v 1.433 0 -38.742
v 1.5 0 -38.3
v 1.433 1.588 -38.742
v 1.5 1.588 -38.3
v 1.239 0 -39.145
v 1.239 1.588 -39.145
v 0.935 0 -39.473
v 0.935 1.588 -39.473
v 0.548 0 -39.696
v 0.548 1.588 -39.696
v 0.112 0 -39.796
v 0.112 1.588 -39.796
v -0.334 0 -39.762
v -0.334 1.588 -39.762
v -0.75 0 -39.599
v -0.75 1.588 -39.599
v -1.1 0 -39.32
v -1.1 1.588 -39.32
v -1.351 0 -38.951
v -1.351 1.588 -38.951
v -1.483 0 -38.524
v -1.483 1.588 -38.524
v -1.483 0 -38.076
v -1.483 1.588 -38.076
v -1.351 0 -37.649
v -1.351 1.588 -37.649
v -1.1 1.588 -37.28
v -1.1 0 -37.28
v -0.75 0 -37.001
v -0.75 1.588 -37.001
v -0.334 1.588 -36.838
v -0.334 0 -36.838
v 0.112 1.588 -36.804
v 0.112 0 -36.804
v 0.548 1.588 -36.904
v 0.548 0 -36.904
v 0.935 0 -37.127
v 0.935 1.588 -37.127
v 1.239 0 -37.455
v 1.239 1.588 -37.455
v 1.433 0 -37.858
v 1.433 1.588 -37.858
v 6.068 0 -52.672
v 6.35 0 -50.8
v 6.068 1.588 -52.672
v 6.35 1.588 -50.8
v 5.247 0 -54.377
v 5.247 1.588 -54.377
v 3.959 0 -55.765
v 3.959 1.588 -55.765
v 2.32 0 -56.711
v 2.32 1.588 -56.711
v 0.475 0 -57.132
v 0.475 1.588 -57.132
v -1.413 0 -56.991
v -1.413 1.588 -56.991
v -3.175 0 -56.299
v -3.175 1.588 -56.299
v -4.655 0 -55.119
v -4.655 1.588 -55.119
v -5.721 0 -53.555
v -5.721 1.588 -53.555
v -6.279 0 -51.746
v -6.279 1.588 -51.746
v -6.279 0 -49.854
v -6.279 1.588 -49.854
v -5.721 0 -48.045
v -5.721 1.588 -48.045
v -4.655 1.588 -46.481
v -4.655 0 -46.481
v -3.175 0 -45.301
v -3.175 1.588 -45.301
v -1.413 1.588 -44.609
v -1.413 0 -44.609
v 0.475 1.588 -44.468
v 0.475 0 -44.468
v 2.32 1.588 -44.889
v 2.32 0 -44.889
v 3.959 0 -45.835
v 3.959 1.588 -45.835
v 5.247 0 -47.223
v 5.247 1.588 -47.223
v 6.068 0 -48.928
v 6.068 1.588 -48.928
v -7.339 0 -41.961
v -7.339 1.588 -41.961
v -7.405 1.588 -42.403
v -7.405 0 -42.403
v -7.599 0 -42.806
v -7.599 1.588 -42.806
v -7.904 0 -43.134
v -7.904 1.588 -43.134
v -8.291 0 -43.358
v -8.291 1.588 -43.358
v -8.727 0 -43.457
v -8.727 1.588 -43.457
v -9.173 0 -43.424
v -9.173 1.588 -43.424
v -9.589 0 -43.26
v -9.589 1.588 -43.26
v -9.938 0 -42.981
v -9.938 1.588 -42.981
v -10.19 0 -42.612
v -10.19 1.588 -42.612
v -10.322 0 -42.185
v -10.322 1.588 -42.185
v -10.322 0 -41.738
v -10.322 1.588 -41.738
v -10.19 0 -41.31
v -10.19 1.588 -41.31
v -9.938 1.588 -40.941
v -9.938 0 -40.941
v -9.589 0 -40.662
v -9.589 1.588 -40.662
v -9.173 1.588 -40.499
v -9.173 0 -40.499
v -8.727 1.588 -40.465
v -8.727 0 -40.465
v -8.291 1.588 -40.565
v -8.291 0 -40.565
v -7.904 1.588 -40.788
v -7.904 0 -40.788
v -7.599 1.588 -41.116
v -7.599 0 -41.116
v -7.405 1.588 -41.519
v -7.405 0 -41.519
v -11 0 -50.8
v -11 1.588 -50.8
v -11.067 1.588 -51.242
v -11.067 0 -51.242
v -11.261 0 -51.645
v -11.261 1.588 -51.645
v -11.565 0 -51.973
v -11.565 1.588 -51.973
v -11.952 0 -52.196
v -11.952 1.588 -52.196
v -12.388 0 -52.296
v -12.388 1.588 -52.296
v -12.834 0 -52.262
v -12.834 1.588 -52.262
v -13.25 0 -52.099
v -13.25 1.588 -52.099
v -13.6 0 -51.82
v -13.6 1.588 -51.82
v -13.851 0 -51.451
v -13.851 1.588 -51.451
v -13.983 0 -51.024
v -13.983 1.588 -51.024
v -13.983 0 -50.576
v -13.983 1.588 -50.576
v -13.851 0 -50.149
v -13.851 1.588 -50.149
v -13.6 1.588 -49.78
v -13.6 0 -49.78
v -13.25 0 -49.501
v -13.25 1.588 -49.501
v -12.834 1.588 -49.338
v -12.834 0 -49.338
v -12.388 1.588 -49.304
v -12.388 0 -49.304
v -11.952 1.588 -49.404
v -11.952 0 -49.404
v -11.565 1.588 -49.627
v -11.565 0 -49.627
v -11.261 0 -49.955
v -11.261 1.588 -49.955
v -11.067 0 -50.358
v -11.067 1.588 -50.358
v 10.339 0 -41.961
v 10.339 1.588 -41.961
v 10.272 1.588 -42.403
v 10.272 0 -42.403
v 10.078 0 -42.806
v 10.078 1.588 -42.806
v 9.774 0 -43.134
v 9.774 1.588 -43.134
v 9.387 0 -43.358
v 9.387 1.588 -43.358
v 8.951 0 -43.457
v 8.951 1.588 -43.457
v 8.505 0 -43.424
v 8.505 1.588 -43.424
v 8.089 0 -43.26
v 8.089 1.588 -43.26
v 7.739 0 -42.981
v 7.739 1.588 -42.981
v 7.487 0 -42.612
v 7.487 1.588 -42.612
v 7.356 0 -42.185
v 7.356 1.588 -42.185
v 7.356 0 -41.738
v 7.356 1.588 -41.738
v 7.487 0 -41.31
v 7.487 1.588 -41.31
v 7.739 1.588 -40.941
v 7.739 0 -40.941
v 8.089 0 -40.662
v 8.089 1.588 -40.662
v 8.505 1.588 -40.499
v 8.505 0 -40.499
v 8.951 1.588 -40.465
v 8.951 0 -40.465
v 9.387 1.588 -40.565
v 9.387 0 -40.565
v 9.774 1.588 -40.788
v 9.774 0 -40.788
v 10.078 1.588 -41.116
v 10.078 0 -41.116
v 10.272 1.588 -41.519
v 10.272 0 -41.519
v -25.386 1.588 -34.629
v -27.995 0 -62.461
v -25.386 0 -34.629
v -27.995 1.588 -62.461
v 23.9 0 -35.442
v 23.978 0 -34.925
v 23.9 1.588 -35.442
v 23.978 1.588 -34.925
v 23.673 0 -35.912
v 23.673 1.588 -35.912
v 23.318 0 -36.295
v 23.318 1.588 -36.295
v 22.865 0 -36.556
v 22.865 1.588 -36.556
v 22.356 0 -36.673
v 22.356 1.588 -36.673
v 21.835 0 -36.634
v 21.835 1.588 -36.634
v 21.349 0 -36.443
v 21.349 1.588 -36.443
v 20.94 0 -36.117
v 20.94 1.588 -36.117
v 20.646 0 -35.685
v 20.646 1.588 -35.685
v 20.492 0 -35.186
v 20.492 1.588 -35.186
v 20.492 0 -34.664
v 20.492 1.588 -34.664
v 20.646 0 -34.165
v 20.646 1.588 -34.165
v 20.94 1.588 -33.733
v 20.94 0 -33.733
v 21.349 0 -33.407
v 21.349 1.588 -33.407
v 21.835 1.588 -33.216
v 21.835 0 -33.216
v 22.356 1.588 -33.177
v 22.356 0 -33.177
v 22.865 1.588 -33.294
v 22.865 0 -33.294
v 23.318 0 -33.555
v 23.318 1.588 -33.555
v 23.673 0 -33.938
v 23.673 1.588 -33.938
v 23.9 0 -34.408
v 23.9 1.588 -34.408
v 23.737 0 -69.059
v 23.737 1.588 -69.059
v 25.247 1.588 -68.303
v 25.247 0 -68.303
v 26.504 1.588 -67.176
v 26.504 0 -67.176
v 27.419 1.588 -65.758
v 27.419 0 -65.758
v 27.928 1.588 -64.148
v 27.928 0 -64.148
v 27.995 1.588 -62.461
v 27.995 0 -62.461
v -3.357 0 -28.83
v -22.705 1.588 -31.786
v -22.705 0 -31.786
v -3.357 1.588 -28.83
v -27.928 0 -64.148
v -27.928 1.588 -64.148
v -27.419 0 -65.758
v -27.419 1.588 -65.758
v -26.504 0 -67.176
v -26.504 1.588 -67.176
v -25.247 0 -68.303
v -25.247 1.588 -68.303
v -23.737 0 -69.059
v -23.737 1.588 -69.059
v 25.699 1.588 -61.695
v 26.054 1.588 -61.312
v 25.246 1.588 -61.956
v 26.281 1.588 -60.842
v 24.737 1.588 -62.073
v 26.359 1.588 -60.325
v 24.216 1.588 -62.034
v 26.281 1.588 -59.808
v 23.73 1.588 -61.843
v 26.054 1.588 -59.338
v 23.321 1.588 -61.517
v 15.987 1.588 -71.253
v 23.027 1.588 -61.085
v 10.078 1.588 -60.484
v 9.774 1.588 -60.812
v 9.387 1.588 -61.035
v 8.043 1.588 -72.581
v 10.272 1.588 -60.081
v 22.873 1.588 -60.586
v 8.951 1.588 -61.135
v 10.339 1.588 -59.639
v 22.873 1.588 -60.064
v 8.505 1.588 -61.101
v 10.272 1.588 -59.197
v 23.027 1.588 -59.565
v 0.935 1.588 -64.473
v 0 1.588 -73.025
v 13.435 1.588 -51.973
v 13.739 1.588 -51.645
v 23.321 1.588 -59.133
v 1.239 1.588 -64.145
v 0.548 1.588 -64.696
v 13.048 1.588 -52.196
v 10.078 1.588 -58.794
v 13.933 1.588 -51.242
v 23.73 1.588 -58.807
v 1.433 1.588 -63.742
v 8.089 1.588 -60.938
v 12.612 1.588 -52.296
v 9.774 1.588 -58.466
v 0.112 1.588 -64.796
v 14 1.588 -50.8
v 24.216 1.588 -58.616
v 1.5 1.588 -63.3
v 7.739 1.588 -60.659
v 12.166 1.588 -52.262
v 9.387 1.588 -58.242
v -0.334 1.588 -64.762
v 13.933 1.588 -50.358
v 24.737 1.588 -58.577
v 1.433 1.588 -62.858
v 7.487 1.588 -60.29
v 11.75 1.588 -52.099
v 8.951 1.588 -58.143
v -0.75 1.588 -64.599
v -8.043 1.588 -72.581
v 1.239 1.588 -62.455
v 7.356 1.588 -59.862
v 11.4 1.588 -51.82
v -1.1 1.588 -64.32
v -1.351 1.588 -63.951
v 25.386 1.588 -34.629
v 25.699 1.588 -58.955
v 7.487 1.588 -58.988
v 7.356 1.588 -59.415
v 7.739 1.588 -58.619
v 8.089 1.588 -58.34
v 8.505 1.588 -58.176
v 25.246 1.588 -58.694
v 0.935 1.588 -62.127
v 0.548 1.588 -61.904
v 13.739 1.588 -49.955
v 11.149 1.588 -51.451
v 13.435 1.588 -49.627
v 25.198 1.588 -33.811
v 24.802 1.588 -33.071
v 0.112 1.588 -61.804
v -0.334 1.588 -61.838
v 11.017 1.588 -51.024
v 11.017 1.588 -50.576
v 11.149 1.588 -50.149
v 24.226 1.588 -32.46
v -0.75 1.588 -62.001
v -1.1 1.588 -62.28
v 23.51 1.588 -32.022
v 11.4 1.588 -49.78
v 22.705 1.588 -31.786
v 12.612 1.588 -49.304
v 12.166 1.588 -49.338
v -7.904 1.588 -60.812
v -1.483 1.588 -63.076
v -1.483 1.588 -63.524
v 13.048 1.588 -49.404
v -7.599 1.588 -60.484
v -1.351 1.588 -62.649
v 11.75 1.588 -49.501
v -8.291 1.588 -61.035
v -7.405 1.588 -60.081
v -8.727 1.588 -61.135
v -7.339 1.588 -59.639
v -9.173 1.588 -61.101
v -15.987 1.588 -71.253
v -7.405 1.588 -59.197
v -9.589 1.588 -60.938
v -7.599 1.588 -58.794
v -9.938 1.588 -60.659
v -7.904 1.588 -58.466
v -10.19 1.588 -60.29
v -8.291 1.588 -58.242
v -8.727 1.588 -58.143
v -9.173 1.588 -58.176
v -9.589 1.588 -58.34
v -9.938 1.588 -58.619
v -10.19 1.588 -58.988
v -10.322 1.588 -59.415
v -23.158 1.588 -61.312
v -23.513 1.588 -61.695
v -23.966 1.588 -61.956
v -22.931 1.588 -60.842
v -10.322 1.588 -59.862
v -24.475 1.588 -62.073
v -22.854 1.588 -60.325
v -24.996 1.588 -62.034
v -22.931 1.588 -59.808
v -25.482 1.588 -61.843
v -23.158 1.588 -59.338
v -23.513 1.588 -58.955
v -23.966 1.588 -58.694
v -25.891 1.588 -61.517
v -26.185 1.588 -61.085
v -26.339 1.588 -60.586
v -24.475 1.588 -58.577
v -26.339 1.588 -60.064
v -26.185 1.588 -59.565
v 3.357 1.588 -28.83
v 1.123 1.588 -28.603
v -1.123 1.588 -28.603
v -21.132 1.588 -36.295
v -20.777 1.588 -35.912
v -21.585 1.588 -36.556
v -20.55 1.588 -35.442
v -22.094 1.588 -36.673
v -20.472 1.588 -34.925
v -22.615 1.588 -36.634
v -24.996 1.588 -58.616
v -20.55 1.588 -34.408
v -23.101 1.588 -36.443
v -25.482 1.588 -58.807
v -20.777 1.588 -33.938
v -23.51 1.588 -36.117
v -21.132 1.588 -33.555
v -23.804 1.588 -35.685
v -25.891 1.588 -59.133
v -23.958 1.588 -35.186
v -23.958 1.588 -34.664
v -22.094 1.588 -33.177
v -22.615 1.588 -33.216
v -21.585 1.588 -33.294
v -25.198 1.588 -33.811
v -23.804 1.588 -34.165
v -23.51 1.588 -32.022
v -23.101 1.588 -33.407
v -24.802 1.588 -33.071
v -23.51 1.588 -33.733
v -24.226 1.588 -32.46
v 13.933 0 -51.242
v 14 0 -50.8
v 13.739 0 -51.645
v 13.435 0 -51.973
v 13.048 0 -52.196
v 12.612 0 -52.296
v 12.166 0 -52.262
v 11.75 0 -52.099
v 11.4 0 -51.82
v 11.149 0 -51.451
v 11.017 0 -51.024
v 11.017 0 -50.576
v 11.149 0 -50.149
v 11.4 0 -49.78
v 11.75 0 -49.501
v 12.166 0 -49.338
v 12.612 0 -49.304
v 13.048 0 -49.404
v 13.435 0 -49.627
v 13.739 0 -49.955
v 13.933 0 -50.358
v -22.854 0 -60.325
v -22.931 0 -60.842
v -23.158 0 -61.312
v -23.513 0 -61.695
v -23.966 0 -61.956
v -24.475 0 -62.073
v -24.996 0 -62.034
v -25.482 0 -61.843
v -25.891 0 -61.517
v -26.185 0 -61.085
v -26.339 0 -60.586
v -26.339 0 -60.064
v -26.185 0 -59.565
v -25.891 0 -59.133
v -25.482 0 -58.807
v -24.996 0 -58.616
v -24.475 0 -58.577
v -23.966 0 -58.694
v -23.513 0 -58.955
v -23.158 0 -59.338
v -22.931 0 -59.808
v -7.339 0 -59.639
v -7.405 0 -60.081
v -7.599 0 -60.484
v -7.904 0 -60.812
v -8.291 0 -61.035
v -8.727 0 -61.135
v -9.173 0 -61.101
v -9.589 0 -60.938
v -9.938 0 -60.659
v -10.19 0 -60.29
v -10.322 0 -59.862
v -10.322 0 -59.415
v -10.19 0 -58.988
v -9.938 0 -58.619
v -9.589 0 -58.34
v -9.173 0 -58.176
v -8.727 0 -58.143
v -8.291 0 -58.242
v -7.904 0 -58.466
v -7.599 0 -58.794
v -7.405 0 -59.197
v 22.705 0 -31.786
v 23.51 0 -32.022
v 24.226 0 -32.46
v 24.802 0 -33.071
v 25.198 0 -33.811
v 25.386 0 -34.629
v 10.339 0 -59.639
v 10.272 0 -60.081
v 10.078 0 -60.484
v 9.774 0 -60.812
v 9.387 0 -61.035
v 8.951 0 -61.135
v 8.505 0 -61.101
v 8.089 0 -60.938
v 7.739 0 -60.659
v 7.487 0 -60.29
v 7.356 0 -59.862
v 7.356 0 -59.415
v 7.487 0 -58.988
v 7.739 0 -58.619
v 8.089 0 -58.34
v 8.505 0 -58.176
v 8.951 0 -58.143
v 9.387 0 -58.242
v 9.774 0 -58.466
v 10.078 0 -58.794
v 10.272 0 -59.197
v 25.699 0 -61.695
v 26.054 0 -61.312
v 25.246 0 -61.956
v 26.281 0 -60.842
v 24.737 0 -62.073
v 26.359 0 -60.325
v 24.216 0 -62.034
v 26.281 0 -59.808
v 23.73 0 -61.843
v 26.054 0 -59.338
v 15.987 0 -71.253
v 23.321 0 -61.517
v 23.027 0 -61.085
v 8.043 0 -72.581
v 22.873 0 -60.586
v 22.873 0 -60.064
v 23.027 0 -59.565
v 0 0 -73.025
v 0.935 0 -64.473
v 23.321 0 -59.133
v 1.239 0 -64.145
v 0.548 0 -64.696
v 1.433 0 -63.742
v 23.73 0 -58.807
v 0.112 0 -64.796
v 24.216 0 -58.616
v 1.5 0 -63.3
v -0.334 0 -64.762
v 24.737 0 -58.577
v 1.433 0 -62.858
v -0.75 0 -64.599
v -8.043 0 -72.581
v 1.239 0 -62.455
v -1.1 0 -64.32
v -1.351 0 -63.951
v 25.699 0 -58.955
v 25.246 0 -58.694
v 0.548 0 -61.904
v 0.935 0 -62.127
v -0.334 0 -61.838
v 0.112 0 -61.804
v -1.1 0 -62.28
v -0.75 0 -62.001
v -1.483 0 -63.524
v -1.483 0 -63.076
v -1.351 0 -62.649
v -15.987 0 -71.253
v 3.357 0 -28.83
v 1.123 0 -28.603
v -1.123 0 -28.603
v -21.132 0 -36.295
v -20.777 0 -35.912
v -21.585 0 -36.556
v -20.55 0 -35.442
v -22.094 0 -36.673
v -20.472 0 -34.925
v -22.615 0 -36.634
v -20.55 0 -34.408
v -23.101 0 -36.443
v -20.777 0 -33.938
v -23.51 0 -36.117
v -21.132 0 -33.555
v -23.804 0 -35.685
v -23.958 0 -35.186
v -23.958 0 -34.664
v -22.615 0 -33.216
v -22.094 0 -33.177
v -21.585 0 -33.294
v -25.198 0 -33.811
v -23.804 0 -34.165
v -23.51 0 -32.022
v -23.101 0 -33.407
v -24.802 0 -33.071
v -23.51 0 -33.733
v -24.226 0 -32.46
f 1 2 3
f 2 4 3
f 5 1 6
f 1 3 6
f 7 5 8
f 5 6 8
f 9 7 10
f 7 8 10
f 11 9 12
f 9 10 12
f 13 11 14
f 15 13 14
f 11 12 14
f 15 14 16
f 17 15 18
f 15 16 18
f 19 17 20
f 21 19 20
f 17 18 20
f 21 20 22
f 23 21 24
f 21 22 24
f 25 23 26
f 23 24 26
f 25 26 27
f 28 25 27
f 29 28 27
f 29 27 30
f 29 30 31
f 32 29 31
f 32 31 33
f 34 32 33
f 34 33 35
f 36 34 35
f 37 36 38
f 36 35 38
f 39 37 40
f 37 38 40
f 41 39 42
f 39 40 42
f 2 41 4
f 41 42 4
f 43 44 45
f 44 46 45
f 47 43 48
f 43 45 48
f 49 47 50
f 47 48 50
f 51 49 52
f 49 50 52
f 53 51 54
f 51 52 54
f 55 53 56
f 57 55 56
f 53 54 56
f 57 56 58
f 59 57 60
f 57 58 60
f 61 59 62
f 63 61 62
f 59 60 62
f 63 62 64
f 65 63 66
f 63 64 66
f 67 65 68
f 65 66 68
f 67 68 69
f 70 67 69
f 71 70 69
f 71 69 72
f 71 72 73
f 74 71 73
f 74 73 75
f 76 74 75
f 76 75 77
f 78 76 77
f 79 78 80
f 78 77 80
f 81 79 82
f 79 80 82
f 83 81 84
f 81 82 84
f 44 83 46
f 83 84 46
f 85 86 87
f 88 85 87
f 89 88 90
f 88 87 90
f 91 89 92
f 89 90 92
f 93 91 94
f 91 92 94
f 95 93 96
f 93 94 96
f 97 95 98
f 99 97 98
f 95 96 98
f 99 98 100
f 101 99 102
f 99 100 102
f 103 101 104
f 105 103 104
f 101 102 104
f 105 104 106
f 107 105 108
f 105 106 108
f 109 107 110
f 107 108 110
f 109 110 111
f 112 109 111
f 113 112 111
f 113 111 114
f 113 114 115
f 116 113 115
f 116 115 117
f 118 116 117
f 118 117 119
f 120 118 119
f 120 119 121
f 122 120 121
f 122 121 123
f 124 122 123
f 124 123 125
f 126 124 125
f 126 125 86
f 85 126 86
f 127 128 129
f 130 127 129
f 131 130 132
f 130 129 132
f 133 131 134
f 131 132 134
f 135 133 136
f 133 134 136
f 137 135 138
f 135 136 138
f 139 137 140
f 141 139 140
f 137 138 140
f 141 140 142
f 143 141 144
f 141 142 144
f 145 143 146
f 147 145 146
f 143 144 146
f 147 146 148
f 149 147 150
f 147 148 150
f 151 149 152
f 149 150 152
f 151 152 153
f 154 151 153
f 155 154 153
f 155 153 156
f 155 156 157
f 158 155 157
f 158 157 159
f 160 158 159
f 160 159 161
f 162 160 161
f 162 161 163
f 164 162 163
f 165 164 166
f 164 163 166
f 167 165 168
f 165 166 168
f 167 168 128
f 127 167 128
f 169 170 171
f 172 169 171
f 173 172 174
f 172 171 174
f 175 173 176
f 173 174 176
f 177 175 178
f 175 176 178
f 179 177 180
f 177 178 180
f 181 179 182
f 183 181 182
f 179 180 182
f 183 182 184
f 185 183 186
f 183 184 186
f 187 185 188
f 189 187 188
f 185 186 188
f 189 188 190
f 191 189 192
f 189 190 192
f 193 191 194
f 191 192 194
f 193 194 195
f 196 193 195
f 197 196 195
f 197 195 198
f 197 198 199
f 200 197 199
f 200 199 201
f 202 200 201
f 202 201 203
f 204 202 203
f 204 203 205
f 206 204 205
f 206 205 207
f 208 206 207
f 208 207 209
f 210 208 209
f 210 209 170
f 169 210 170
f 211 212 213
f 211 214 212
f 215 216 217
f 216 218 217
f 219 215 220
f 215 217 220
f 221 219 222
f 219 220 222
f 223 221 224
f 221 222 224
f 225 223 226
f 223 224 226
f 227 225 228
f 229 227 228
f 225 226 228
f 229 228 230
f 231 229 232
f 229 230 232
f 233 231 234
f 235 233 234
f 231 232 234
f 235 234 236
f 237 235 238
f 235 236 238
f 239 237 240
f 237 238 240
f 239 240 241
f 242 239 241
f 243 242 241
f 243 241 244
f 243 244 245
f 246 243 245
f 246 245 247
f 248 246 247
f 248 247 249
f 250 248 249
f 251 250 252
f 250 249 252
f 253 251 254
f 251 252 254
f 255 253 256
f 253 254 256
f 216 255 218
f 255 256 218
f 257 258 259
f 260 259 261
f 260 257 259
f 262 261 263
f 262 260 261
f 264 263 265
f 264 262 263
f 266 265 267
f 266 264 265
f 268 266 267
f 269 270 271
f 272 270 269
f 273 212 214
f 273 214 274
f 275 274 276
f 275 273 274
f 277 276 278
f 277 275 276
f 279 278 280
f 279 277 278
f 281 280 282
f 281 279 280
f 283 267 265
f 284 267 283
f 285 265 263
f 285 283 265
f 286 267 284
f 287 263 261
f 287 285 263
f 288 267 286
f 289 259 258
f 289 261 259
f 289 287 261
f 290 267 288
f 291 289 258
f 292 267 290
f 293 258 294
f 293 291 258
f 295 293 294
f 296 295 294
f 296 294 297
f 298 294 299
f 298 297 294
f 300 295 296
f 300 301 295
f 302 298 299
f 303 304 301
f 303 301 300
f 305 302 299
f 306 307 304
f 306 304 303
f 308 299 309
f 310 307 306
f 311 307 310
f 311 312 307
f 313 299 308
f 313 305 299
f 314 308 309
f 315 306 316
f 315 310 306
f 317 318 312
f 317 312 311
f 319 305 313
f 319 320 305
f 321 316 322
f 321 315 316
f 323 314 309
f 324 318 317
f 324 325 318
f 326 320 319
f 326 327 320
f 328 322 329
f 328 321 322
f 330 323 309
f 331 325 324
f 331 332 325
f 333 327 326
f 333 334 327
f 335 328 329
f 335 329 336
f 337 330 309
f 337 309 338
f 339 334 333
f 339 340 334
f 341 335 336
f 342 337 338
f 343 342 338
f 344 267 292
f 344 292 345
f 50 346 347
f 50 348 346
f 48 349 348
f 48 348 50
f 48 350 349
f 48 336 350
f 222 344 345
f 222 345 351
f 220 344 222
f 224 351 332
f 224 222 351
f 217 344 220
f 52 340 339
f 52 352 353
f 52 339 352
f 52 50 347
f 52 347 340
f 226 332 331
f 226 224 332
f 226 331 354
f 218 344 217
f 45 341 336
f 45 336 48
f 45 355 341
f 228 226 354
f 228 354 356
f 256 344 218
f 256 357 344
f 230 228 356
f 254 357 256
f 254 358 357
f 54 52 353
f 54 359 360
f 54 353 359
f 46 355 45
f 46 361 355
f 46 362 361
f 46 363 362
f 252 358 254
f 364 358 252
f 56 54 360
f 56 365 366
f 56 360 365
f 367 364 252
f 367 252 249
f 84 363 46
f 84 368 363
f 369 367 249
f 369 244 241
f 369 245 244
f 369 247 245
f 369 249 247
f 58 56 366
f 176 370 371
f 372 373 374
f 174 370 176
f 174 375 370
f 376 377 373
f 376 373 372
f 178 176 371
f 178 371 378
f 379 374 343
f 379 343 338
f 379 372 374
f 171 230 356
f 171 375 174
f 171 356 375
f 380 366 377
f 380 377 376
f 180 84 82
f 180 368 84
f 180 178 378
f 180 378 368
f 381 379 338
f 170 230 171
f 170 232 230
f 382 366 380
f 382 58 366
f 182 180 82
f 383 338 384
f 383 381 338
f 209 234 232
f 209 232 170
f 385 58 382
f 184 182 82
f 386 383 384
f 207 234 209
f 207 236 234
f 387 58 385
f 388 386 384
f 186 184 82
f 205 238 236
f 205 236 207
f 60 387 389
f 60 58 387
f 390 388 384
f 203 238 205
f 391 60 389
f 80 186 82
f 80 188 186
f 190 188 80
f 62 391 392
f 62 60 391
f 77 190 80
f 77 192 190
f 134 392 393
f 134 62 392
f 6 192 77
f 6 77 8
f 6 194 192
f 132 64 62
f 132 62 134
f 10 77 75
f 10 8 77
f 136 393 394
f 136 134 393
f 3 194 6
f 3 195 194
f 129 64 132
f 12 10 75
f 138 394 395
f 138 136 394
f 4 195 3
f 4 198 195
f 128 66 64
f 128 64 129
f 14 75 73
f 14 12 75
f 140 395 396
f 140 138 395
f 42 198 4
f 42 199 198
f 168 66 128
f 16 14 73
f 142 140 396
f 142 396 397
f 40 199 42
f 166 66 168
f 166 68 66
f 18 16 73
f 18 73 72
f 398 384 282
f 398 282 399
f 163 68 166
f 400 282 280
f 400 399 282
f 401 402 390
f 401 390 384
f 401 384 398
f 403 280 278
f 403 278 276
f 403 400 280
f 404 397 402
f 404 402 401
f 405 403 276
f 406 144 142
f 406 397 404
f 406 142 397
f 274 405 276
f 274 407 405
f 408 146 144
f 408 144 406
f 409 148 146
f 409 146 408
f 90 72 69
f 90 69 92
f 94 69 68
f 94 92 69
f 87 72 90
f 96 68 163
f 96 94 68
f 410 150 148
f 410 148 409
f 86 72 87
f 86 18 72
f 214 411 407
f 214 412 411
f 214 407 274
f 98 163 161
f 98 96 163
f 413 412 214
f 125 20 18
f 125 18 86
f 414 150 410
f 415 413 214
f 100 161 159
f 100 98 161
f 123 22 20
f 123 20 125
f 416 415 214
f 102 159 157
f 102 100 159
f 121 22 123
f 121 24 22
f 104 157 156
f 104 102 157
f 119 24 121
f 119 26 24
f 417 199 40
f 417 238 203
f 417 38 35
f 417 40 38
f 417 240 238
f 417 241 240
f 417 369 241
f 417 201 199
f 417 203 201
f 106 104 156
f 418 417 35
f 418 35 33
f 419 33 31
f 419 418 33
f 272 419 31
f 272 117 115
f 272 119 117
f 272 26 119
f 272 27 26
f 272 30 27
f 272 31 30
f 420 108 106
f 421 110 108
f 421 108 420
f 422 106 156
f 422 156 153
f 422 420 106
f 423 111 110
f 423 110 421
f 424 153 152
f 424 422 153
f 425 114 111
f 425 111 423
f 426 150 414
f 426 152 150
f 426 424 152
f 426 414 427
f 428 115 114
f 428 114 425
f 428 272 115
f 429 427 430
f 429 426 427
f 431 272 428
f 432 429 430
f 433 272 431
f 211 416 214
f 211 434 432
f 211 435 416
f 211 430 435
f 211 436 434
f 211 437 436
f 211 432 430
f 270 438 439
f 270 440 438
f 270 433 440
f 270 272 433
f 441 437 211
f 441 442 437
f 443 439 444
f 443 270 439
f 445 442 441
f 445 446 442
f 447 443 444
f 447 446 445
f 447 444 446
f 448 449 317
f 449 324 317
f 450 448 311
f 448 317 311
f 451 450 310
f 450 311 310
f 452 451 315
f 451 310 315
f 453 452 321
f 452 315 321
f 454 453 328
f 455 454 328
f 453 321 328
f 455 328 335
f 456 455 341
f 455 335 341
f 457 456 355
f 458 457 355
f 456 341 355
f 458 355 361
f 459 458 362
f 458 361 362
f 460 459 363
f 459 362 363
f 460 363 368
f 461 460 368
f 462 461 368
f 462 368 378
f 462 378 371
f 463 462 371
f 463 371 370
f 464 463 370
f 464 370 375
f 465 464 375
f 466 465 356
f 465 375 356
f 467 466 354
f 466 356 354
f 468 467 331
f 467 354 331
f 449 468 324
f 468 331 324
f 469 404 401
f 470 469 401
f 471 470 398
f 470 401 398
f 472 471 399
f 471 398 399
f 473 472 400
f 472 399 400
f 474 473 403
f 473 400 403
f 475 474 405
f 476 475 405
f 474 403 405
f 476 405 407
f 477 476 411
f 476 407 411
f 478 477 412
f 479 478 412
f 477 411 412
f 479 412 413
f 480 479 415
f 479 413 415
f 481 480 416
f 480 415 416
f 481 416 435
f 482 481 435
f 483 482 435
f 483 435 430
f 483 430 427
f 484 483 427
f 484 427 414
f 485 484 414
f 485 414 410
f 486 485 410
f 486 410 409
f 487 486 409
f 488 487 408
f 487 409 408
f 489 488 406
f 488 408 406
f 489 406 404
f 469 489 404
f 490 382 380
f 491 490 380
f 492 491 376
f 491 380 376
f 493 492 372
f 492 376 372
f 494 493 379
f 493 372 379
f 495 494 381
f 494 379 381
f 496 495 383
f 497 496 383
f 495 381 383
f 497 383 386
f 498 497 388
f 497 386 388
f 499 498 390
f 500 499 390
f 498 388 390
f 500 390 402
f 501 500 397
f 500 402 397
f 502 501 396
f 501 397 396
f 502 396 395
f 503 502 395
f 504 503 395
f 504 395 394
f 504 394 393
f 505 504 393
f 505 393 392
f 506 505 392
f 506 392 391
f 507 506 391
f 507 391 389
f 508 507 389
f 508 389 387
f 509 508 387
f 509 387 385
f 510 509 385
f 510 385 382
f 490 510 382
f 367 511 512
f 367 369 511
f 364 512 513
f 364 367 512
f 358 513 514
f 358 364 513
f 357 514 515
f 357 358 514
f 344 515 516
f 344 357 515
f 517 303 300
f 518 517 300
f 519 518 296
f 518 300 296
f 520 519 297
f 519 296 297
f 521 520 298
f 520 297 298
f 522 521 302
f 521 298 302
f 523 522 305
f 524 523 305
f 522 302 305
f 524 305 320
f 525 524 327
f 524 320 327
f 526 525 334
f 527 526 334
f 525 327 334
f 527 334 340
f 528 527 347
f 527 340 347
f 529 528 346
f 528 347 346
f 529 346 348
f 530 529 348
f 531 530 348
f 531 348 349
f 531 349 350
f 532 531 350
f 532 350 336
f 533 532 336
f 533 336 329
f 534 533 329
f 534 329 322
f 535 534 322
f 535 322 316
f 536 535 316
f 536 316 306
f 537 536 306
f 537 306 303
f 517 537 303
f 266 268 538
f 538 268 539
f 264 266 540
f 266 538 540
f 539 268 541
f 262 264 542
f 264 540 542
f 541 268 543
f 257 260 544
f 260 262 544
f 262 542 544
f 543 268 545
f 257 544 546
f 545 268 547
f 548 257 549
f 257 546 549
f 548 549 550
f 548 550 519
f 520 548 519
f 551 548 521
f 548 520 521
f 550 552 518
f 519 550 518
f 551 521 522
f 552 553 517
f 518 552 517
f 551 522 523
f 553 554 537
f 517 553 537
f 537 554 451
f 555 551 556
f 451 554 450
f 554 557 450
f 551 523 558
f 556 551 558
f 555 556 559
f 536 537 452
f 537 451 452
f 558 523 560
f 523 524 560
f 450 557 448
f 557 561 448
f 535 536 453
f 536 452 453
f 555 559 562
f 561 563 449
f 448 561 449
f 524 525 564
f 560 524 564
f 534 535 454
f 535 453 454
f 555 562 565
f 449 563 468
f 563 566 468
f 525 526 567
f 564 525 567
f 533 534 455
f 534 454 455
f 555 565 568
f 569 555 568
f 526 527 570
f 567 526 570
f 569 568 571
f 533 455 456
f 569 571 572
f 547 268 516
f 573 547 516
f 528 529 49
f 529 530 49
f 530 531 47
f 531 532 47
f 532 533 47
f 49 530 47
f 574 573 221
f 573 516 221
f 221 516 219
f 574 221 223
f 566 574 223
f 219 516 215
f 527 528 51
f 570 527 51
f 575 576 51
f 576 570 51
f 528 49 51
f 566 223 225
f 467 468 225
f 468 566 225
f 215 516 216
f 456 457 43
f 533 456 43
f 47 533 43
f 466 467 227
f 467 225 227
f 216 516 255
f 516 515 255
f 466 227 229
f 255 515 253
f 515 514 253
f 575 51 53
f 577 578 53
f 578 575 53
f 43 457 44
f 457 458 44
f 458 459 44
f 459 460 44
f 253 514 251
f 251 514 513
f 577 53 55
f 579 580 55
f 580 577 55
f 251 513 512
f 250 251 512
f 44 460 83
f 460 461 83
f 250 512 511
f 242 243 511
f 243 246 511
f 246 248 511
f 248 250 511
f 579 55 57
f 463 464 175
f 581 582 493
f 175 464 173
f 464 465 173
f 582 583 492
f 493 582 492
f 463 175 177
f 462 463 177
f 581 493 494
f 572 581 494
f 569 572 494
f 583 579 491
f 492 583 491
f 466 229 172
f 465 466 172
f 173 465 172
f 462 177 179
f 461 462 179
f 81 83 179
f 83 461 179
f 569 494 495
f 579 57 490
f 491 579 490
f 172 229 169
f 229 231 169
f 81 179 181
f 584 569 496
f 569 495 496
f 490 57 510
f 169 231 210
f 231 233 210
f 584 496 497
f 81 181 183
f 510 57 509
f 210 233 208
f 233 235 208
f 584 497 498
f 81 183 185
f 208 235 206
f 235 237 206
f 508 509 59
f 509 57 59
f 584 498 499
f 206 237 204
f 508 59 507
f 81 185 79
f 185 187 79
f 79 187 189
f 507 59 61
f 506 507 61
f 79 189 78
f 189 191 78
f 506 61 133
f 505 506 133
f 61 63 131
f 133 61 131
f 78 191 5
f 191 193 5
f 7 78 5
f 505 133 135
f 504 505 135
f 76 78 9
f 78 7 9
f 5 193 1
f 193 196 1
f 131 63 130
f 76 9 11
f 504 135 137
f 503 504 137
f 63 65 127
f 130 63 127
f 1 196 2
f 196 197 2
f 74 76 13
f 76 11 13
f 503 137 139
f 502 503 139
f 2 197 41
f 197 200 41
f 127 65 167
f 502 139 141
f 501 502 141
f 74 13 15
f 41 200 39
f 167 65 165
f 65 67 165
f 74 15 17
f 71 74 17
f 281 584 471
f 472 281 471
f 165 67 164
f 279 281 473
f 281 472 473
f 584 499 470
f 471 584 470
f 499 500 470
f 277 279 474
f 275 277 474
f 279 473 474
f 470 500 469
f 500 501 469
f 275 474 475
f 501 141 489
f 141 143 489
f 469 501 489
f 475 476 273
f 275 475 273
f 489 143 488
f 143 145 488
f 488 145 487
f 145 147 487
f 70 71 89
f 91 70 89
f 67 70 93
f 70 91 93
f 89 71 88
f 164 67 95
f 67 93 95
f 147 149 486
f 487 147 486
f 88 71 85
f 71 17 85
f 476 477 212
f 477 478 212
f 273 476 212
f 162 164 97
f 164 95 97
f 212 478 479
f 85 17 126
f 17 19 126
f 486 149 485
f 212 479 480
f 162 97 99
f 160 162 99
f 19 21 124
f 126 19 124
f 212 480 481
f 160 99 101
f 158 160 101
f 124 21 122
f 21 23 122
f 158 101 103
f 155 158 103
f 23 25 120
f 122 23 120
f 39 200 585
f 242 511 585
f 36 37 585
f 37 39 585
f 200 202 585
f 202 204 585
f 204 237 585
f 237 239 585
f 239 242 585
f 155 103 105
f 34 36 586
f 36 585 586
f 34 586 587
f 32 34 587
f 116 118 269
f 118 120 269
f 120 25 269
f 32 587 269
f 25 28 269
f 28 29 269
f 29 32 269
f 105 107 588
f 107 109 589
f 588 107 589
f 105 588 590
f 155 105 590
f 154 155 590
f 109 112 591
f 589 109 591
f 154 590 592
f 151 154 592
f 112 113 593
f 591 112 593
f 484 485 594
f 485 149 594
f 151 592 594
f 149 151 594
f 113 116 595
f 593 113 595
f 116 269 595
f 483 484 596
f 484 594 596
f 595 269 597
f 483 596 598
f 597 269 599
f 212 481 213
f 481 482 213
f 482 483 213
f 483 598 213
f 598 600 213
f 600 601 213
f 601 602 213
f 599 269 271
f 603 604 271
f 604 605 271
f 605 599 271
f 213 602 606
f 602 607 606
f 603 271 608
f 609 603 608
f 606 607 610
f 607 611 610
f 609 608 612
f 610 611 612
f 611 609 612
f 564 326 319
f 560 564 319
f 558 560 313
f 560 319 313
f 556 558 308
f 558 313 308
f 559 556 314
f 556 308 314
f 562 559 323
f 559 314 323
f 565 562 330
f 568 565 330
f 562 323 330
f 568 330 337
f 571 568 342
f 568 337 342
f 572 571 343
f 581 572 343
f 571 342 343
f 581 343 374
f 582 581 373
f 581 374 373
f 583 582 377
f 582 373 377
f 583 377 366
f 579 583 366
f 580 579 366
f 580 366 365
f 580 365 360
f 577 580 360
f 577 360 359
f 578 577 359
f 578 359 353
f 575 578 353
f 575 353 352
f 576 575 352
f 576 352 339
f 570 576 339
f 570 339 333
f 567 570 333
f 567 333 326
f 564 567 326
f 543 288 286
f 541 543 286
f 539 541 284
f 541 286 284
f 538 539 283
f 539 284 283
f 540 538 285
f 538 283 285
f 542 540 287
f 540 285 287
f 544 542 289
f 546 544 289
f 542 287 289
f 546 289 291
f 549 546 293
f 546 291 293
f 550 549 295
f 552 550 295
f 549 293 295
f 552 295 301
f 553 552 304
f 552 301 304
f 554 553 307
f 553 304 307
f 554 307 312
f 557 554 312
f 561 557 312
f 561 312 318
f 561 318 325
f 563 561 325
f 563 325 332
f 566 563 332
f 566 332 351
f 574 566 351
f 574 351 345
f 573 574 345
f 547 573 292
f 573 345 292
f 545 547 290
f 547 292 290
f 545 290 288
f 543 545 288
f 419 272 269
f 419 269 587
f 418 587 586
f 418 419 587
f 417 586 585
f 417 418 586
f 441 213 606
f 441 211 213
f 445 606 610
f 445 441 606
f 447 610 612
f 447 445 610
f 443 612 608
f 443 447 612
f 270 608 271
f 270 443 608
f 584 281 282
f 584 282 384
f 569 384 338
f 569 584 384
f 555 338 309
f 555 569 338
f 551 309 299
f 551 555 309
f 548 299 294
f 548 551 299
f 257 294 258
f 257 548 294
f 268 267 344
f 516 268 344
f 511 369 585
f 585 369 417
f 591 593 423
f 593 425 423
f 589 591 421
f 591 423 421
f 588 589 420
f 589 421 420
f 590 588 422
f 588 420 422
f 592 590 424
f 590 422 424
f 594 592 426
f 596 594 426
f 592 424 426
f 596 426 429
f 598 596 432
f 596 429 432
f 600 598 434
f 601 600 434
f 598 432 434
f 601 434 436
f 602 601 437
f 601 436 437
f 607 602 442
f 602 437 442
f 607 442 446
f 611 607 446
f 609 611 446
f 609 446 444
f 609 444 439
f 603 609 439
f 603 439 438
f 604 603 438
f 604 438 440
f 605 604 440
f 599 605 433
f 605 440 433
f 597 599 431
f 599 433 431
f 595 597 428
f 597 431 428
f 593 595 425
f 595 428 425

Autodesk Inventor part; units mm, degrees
ref_plane "YZ Plane" through (0, 0, 0) normal (1, 0, 0) x (0, 1, 0)
ref_plane "XZ Plane" through (0, 0, 0) normal (0, 1, 0) x (-1, 0, 0)
ref_plane "XY Plane" through (0, 0, 0) normal (0, 0, 1) x (1, 0, 0)
sketch "Sketch1" plane through (0, 0, 0) normal (0, 1, 0) x (-1, 0, 0)
  circle A0 centre (0, 0) radius 73.025
  line L0 (0, 0) -> (0, -73.025) construction
  line L1 (0, 0) -> (-12.6807, -71.9156)
  line L2 (0, 0) -> (12.6807, -71.9156)
  line L3 (0, 0) -> (72.3143, -10.1631)
  line L4 (0, 0) -> (64.4772, -34.2832)
  line L5 (0, 0) -> (32.0121, 65.6344)
  line L6 (0, 0) -> (52.5298, 50.7274)
  line L7 (0, 0) -> (-52.5298, 50.7274)
  line L8 (0, 0) -> (-32.0121, 65.6344)
  line L9 (0, 0) -> (-64.4772, -34.2832)
  line L10 (0, 0) -> (-72.3143, -10.1631)
  circle A1 centre (0, 0) radius 69.85
  arc A2 (4.7597, -69.6876) -> (-4.7597, -69.6876) centre (0, -69.85) ccw
  arc A3 (67.7477, -17.0079) -> (64.806, -26.0614) centre (66.4313, -21.5848) ccw
  arc A4 (37.1107, 59.1762) -> (44.8121, 53.5808) centre (41.0568, 56.5098) ccw
  arc A5 (-44.8121, 53.5808) -> (-37.1107, 59.1762) centre (-41.0568, 56.5098) ccw
  arc A6 (-64.806, -26.0614) -> (-67.7477, -17.0079) centre (-66.4313, -21.5848) ccw
  point P0 (61.6739, -32.7926)
  point P1 (69.1702, -9.7212)
  point P2 (50.2459, 48.5219)
  point P3 (30.6202, 62.7808)
  point P4 (-30.6202, 62.7808)
  point P5 (-50.2459, 48.5219)
  point P6 (-69.1702, -9.7212)
  point P7 (-61.6739, -32.7926)
  point P8 (-12.1293, -68.7888)
  point P9 (12.1293, -68.7888)
  point P10 (64.806, -26.0614)
  point P11 (67.7477, -17.0079)
  point P12 (44.8121, 53.5808)
  point P13 (37.1107, 59.1762)
  point P14 (-37.1107, 59.1762)
  point P15 (-67.7477, -17.0079)
  dimension "d0" = 146.05
  dimension "d1" = 10
  dimension "d4" = 360
  dimension "d6" = 3.175
  dimension "d10" = 9.525
  dimension "d13" = 360
extrude "Extrusion1" add sketch "Sketch1" along normal blind 1.5875 contours A0 L3 A1 L6 | L5 A1 L8 A0 | A1 L3 L6 | L6 L5 A1 A4 | A0 L2 A1 L4 | A1 A3 L4 L3 | L5 L8 A1 | L2 A1 A2 L1 | L4 A1 L2 | L10 A1 L7 | L7 A1 A5 L8 | L1 A1 L9 | L9 A1 A6 L10 | A0 L1 A1 L2 | L7 A1 L10 A0 | L1 A0 L9 A1 | A2 A1
fillet "Fillet1" radius 1.5875 24 edges at (30.6202, 0.7937, 62.7808) (32.0121, 0.7937, 65.6344) (-30.6202, 0.7937, 62.7808) (-32.0121, 0.7937, 65.6344) (-52.5298, 0.7937, 50.7274) (-50.2459, 0.7937, 48.5219) (52.5298, 0.7937, 50.7274) (50.2459, 0.7937, 48.5219) (64.4772, 0.7937, -34.2832) (61.6739, 0.7937, -32.7926) (72.3143, 0.7937, -10.1631) (69.1702, 0.7937, -9.7212) (-72.3143, 0.7937, -10.1631) (-69.1702, 0.7937, -9.7212) (-64.4772, 0.7937, -34.2832) (-61.6739, 0.7937, -32.7926) (37.1107, 0.7937, 59.1762) (44.8121, 0.7937, 53.5808) (-44.8121, 0.7937, 53.5808) (-37.1107, 0.7937, 59.1762) (-64.806, 0.7937, -26.0614) (-67.7477, 0.7937, -17.0079) (67.7477, 0.7937, -17.0079) (64.806, 0.7937, -26.0614)
sketch "Sketch5" plane through (0, 1.5875, 0) normal (0, 1, 0) x (1, 0, 0)
  line L0 (0, 0) -> (0, 65.0875) construction
  circle A0 centre (0, 50.8) radius 22.225
  arc A1 (63.6995, 35.7075) -> (-63.6995, 35.7075) centre (0, 0) ccw projected
  circle A2 centre (0, 50.8) radius 12.5 construction
  circle A3 centre (-24.6062, 60.325) radius 1.7526
  circle A4 centre (-24.6062, 60.325) radius 3.175 construction
  circle A5 centre (-22.225, 34.925) radius 3.175
  circle A6 centre (-22.225, 34.925) radius 1.7526
  circle A7 centre (24.6062, 60.325) radius 1.7526
  circle A8 centre (24.6062, 60.325) radius 3.175
  circle A9 centre (22.225, 34.925) radius 3.175
  circle A10 centre (22.225, 34.925) radius 1.7526
  arc A11 (-62.3874, 31.414) -> (-64.248, 27.4085) centre (0, 0) ccw projected
  arc A12 (63.6995, 35.7075) -> (-63.6995, 35.7075) centre (0, 0) ccw projected
  line L1 (-28.4451, 67.2572) -> (-25.3861, 34.6286)
  line L2 (-22.7046, 31.7864) -> (-3.3572, 28.83)
  line L3 (28.4451, 67.2572) -> (25.3861, 34.6286)
  line L4 (22.7046, 31.7864) -> (3.3572, 28.83)
  circle A13 centre (0, 63.3) radius 1.5
  circle A14 centre (-8.8388, 59.6388) radius 1.5
  circle A15 centre (-12.5, 50.8) radius 1.5
  circle A16 centre (-8.8388, 41.9612) radius 1.5
  circle A17 centre (0, 50.8) radius 6.35
  circle A18 centre (0, 0) radius 73.025
  circle A19 centre (0, 38.3) radius 1.5
  circle A20 centre (8.8388, 41.9612) radius 1.5
  circle A21 centre (12.5, 50.8) radius 1.5
  circle A22 centre (8.8388, 59.6388) radius 1.5
  point P0 (-63.6995, 35.7075)
  dimension "d39" = 25
  dimension "d40" = 44.45
  dimension "d41" = 3.5052
  dimension "d42" = 6.35
  dimension "d43" = 9.525
  dimension "d44" = 24.6062
  dimension "d45" = 6.35
  dimension "d46" = 3.5052
  dimension "d47" = 15.875
  dimension "d48" = 22.225
  dimension "d63" = 3
  dimension "d66" = 360
  dimension "d68" = 12.7
extrude "Extrusion3" cut sketch "Sketch5" against normal blind 25.4 contours A0 L4 A9 L3 A1 A18 L1 A5 L2 | A3 | A6 | A7 | A10 | A13 | A14 | A15 | A16 | A17 | A19 | A20 | A21 | A22
fillet "Fillet4" radius 6.35 2 edges at (-28.4451, 0.7937, -67.2572) (28.4451, 0.7937, -67.2572)
sketch "Sketch7" plane through (0, 1.5875, 0) normal (0, 1, 0) x (1, 0, 0)
  arc A0 (27.9955, 62.4615) -> (23.7373, 69.0593) centre (21.6732, 63.0542) ccw projected
  arc A1 (23.7373, 69.0593) -> (-23.7373, 69.0593) centre (0, 0) ccw projected
  arc A2 (-23.7373, 69.0593) -> (-27.9955, 62.4615) centre (-21.6732, 63.0542) ccw projected
  line L0 (-27.9955, 62.4615) -> (-25.3861, 34.6286) projected
  arc A3 (-25.3861, 34.6286) -> (-22.7046, 31.7864) centre (-22.225, 34.925) ccw projected
  line L1 (-22.7046, 31.7864) -> (-3.3572, 28.83) projected
  arc A4 (-3.3572, 28.83) -> (3.3572, 28.83) centre (0, 50.8) ccw projected
  line L2 (3.3572, 28.83) -> (22.7046, 31.7864) projected
  arc A5 (22.7046, 31.7864) -> (25.3861, 34.6286) centre (22.225, 34.925) ccw projected
  line L3 (25.3861, 34.6286) -> (27.9955, 62.4615) projected
  circle A6 centre (8.8388, 41.9612) radius 1.5 projected
  circle A7 centre (-8.8388, 59.6388) radius 1.5 projected
  circle A8 centre (22.225, 34.925) radius 1.7526 projected
  circle A9 centre (-22.225, 34.925) radius 1.7526 projected
  circle A10 centre (0, 63.3) radius 1.5 projected
  circle A11 centre (12.5, 50.8) radius 1.5 projected
  circle A12 centre (0, 38.3) radius 1.5 projected
  circle A13 centre (0, 50.8) radius 6.35 projected
  circle A14 centre (24.6062, 60.325) radius 1.7526 projected
  circle A15 centre (-24.6062, 60.325) radius 1.7526 projected
  circle A16 centre (-12.5, 50.8) radius 1.5 projected
  circle A17 centre (-8.8388, 41.9612) radius 1.5 projected
  circle A18 centre (8.8388, 59.6388) radius 1.5 projected
  circle A19 centre (0, 50.8) radius 19.05
  line L4 (-18.9668, 49.0219) -> (-17.2732, 30.9565)
  line L5 (-3.3572, 28.83) -> (-22.7046, 31.7864) projected
  line L6 (-27.9955, 62.4615) -> (-25.3861, 34.6286) projected
  arc A20 (23.7373, 69.0593) -> (-23.7373, 69.0593) centre (0, 0) ccw projected
  line L7 (0, 73.025) -> (0, 28.575) construction
  line L8 (18.9668, 49.0219) -> (17.2732, 30.9565)
  dimension "d70" = 38.1
equation "\"d45\" = d42"
equation "\"d46\" = d41"
properties part number "Top Plate" material "Aluminum 6061"
